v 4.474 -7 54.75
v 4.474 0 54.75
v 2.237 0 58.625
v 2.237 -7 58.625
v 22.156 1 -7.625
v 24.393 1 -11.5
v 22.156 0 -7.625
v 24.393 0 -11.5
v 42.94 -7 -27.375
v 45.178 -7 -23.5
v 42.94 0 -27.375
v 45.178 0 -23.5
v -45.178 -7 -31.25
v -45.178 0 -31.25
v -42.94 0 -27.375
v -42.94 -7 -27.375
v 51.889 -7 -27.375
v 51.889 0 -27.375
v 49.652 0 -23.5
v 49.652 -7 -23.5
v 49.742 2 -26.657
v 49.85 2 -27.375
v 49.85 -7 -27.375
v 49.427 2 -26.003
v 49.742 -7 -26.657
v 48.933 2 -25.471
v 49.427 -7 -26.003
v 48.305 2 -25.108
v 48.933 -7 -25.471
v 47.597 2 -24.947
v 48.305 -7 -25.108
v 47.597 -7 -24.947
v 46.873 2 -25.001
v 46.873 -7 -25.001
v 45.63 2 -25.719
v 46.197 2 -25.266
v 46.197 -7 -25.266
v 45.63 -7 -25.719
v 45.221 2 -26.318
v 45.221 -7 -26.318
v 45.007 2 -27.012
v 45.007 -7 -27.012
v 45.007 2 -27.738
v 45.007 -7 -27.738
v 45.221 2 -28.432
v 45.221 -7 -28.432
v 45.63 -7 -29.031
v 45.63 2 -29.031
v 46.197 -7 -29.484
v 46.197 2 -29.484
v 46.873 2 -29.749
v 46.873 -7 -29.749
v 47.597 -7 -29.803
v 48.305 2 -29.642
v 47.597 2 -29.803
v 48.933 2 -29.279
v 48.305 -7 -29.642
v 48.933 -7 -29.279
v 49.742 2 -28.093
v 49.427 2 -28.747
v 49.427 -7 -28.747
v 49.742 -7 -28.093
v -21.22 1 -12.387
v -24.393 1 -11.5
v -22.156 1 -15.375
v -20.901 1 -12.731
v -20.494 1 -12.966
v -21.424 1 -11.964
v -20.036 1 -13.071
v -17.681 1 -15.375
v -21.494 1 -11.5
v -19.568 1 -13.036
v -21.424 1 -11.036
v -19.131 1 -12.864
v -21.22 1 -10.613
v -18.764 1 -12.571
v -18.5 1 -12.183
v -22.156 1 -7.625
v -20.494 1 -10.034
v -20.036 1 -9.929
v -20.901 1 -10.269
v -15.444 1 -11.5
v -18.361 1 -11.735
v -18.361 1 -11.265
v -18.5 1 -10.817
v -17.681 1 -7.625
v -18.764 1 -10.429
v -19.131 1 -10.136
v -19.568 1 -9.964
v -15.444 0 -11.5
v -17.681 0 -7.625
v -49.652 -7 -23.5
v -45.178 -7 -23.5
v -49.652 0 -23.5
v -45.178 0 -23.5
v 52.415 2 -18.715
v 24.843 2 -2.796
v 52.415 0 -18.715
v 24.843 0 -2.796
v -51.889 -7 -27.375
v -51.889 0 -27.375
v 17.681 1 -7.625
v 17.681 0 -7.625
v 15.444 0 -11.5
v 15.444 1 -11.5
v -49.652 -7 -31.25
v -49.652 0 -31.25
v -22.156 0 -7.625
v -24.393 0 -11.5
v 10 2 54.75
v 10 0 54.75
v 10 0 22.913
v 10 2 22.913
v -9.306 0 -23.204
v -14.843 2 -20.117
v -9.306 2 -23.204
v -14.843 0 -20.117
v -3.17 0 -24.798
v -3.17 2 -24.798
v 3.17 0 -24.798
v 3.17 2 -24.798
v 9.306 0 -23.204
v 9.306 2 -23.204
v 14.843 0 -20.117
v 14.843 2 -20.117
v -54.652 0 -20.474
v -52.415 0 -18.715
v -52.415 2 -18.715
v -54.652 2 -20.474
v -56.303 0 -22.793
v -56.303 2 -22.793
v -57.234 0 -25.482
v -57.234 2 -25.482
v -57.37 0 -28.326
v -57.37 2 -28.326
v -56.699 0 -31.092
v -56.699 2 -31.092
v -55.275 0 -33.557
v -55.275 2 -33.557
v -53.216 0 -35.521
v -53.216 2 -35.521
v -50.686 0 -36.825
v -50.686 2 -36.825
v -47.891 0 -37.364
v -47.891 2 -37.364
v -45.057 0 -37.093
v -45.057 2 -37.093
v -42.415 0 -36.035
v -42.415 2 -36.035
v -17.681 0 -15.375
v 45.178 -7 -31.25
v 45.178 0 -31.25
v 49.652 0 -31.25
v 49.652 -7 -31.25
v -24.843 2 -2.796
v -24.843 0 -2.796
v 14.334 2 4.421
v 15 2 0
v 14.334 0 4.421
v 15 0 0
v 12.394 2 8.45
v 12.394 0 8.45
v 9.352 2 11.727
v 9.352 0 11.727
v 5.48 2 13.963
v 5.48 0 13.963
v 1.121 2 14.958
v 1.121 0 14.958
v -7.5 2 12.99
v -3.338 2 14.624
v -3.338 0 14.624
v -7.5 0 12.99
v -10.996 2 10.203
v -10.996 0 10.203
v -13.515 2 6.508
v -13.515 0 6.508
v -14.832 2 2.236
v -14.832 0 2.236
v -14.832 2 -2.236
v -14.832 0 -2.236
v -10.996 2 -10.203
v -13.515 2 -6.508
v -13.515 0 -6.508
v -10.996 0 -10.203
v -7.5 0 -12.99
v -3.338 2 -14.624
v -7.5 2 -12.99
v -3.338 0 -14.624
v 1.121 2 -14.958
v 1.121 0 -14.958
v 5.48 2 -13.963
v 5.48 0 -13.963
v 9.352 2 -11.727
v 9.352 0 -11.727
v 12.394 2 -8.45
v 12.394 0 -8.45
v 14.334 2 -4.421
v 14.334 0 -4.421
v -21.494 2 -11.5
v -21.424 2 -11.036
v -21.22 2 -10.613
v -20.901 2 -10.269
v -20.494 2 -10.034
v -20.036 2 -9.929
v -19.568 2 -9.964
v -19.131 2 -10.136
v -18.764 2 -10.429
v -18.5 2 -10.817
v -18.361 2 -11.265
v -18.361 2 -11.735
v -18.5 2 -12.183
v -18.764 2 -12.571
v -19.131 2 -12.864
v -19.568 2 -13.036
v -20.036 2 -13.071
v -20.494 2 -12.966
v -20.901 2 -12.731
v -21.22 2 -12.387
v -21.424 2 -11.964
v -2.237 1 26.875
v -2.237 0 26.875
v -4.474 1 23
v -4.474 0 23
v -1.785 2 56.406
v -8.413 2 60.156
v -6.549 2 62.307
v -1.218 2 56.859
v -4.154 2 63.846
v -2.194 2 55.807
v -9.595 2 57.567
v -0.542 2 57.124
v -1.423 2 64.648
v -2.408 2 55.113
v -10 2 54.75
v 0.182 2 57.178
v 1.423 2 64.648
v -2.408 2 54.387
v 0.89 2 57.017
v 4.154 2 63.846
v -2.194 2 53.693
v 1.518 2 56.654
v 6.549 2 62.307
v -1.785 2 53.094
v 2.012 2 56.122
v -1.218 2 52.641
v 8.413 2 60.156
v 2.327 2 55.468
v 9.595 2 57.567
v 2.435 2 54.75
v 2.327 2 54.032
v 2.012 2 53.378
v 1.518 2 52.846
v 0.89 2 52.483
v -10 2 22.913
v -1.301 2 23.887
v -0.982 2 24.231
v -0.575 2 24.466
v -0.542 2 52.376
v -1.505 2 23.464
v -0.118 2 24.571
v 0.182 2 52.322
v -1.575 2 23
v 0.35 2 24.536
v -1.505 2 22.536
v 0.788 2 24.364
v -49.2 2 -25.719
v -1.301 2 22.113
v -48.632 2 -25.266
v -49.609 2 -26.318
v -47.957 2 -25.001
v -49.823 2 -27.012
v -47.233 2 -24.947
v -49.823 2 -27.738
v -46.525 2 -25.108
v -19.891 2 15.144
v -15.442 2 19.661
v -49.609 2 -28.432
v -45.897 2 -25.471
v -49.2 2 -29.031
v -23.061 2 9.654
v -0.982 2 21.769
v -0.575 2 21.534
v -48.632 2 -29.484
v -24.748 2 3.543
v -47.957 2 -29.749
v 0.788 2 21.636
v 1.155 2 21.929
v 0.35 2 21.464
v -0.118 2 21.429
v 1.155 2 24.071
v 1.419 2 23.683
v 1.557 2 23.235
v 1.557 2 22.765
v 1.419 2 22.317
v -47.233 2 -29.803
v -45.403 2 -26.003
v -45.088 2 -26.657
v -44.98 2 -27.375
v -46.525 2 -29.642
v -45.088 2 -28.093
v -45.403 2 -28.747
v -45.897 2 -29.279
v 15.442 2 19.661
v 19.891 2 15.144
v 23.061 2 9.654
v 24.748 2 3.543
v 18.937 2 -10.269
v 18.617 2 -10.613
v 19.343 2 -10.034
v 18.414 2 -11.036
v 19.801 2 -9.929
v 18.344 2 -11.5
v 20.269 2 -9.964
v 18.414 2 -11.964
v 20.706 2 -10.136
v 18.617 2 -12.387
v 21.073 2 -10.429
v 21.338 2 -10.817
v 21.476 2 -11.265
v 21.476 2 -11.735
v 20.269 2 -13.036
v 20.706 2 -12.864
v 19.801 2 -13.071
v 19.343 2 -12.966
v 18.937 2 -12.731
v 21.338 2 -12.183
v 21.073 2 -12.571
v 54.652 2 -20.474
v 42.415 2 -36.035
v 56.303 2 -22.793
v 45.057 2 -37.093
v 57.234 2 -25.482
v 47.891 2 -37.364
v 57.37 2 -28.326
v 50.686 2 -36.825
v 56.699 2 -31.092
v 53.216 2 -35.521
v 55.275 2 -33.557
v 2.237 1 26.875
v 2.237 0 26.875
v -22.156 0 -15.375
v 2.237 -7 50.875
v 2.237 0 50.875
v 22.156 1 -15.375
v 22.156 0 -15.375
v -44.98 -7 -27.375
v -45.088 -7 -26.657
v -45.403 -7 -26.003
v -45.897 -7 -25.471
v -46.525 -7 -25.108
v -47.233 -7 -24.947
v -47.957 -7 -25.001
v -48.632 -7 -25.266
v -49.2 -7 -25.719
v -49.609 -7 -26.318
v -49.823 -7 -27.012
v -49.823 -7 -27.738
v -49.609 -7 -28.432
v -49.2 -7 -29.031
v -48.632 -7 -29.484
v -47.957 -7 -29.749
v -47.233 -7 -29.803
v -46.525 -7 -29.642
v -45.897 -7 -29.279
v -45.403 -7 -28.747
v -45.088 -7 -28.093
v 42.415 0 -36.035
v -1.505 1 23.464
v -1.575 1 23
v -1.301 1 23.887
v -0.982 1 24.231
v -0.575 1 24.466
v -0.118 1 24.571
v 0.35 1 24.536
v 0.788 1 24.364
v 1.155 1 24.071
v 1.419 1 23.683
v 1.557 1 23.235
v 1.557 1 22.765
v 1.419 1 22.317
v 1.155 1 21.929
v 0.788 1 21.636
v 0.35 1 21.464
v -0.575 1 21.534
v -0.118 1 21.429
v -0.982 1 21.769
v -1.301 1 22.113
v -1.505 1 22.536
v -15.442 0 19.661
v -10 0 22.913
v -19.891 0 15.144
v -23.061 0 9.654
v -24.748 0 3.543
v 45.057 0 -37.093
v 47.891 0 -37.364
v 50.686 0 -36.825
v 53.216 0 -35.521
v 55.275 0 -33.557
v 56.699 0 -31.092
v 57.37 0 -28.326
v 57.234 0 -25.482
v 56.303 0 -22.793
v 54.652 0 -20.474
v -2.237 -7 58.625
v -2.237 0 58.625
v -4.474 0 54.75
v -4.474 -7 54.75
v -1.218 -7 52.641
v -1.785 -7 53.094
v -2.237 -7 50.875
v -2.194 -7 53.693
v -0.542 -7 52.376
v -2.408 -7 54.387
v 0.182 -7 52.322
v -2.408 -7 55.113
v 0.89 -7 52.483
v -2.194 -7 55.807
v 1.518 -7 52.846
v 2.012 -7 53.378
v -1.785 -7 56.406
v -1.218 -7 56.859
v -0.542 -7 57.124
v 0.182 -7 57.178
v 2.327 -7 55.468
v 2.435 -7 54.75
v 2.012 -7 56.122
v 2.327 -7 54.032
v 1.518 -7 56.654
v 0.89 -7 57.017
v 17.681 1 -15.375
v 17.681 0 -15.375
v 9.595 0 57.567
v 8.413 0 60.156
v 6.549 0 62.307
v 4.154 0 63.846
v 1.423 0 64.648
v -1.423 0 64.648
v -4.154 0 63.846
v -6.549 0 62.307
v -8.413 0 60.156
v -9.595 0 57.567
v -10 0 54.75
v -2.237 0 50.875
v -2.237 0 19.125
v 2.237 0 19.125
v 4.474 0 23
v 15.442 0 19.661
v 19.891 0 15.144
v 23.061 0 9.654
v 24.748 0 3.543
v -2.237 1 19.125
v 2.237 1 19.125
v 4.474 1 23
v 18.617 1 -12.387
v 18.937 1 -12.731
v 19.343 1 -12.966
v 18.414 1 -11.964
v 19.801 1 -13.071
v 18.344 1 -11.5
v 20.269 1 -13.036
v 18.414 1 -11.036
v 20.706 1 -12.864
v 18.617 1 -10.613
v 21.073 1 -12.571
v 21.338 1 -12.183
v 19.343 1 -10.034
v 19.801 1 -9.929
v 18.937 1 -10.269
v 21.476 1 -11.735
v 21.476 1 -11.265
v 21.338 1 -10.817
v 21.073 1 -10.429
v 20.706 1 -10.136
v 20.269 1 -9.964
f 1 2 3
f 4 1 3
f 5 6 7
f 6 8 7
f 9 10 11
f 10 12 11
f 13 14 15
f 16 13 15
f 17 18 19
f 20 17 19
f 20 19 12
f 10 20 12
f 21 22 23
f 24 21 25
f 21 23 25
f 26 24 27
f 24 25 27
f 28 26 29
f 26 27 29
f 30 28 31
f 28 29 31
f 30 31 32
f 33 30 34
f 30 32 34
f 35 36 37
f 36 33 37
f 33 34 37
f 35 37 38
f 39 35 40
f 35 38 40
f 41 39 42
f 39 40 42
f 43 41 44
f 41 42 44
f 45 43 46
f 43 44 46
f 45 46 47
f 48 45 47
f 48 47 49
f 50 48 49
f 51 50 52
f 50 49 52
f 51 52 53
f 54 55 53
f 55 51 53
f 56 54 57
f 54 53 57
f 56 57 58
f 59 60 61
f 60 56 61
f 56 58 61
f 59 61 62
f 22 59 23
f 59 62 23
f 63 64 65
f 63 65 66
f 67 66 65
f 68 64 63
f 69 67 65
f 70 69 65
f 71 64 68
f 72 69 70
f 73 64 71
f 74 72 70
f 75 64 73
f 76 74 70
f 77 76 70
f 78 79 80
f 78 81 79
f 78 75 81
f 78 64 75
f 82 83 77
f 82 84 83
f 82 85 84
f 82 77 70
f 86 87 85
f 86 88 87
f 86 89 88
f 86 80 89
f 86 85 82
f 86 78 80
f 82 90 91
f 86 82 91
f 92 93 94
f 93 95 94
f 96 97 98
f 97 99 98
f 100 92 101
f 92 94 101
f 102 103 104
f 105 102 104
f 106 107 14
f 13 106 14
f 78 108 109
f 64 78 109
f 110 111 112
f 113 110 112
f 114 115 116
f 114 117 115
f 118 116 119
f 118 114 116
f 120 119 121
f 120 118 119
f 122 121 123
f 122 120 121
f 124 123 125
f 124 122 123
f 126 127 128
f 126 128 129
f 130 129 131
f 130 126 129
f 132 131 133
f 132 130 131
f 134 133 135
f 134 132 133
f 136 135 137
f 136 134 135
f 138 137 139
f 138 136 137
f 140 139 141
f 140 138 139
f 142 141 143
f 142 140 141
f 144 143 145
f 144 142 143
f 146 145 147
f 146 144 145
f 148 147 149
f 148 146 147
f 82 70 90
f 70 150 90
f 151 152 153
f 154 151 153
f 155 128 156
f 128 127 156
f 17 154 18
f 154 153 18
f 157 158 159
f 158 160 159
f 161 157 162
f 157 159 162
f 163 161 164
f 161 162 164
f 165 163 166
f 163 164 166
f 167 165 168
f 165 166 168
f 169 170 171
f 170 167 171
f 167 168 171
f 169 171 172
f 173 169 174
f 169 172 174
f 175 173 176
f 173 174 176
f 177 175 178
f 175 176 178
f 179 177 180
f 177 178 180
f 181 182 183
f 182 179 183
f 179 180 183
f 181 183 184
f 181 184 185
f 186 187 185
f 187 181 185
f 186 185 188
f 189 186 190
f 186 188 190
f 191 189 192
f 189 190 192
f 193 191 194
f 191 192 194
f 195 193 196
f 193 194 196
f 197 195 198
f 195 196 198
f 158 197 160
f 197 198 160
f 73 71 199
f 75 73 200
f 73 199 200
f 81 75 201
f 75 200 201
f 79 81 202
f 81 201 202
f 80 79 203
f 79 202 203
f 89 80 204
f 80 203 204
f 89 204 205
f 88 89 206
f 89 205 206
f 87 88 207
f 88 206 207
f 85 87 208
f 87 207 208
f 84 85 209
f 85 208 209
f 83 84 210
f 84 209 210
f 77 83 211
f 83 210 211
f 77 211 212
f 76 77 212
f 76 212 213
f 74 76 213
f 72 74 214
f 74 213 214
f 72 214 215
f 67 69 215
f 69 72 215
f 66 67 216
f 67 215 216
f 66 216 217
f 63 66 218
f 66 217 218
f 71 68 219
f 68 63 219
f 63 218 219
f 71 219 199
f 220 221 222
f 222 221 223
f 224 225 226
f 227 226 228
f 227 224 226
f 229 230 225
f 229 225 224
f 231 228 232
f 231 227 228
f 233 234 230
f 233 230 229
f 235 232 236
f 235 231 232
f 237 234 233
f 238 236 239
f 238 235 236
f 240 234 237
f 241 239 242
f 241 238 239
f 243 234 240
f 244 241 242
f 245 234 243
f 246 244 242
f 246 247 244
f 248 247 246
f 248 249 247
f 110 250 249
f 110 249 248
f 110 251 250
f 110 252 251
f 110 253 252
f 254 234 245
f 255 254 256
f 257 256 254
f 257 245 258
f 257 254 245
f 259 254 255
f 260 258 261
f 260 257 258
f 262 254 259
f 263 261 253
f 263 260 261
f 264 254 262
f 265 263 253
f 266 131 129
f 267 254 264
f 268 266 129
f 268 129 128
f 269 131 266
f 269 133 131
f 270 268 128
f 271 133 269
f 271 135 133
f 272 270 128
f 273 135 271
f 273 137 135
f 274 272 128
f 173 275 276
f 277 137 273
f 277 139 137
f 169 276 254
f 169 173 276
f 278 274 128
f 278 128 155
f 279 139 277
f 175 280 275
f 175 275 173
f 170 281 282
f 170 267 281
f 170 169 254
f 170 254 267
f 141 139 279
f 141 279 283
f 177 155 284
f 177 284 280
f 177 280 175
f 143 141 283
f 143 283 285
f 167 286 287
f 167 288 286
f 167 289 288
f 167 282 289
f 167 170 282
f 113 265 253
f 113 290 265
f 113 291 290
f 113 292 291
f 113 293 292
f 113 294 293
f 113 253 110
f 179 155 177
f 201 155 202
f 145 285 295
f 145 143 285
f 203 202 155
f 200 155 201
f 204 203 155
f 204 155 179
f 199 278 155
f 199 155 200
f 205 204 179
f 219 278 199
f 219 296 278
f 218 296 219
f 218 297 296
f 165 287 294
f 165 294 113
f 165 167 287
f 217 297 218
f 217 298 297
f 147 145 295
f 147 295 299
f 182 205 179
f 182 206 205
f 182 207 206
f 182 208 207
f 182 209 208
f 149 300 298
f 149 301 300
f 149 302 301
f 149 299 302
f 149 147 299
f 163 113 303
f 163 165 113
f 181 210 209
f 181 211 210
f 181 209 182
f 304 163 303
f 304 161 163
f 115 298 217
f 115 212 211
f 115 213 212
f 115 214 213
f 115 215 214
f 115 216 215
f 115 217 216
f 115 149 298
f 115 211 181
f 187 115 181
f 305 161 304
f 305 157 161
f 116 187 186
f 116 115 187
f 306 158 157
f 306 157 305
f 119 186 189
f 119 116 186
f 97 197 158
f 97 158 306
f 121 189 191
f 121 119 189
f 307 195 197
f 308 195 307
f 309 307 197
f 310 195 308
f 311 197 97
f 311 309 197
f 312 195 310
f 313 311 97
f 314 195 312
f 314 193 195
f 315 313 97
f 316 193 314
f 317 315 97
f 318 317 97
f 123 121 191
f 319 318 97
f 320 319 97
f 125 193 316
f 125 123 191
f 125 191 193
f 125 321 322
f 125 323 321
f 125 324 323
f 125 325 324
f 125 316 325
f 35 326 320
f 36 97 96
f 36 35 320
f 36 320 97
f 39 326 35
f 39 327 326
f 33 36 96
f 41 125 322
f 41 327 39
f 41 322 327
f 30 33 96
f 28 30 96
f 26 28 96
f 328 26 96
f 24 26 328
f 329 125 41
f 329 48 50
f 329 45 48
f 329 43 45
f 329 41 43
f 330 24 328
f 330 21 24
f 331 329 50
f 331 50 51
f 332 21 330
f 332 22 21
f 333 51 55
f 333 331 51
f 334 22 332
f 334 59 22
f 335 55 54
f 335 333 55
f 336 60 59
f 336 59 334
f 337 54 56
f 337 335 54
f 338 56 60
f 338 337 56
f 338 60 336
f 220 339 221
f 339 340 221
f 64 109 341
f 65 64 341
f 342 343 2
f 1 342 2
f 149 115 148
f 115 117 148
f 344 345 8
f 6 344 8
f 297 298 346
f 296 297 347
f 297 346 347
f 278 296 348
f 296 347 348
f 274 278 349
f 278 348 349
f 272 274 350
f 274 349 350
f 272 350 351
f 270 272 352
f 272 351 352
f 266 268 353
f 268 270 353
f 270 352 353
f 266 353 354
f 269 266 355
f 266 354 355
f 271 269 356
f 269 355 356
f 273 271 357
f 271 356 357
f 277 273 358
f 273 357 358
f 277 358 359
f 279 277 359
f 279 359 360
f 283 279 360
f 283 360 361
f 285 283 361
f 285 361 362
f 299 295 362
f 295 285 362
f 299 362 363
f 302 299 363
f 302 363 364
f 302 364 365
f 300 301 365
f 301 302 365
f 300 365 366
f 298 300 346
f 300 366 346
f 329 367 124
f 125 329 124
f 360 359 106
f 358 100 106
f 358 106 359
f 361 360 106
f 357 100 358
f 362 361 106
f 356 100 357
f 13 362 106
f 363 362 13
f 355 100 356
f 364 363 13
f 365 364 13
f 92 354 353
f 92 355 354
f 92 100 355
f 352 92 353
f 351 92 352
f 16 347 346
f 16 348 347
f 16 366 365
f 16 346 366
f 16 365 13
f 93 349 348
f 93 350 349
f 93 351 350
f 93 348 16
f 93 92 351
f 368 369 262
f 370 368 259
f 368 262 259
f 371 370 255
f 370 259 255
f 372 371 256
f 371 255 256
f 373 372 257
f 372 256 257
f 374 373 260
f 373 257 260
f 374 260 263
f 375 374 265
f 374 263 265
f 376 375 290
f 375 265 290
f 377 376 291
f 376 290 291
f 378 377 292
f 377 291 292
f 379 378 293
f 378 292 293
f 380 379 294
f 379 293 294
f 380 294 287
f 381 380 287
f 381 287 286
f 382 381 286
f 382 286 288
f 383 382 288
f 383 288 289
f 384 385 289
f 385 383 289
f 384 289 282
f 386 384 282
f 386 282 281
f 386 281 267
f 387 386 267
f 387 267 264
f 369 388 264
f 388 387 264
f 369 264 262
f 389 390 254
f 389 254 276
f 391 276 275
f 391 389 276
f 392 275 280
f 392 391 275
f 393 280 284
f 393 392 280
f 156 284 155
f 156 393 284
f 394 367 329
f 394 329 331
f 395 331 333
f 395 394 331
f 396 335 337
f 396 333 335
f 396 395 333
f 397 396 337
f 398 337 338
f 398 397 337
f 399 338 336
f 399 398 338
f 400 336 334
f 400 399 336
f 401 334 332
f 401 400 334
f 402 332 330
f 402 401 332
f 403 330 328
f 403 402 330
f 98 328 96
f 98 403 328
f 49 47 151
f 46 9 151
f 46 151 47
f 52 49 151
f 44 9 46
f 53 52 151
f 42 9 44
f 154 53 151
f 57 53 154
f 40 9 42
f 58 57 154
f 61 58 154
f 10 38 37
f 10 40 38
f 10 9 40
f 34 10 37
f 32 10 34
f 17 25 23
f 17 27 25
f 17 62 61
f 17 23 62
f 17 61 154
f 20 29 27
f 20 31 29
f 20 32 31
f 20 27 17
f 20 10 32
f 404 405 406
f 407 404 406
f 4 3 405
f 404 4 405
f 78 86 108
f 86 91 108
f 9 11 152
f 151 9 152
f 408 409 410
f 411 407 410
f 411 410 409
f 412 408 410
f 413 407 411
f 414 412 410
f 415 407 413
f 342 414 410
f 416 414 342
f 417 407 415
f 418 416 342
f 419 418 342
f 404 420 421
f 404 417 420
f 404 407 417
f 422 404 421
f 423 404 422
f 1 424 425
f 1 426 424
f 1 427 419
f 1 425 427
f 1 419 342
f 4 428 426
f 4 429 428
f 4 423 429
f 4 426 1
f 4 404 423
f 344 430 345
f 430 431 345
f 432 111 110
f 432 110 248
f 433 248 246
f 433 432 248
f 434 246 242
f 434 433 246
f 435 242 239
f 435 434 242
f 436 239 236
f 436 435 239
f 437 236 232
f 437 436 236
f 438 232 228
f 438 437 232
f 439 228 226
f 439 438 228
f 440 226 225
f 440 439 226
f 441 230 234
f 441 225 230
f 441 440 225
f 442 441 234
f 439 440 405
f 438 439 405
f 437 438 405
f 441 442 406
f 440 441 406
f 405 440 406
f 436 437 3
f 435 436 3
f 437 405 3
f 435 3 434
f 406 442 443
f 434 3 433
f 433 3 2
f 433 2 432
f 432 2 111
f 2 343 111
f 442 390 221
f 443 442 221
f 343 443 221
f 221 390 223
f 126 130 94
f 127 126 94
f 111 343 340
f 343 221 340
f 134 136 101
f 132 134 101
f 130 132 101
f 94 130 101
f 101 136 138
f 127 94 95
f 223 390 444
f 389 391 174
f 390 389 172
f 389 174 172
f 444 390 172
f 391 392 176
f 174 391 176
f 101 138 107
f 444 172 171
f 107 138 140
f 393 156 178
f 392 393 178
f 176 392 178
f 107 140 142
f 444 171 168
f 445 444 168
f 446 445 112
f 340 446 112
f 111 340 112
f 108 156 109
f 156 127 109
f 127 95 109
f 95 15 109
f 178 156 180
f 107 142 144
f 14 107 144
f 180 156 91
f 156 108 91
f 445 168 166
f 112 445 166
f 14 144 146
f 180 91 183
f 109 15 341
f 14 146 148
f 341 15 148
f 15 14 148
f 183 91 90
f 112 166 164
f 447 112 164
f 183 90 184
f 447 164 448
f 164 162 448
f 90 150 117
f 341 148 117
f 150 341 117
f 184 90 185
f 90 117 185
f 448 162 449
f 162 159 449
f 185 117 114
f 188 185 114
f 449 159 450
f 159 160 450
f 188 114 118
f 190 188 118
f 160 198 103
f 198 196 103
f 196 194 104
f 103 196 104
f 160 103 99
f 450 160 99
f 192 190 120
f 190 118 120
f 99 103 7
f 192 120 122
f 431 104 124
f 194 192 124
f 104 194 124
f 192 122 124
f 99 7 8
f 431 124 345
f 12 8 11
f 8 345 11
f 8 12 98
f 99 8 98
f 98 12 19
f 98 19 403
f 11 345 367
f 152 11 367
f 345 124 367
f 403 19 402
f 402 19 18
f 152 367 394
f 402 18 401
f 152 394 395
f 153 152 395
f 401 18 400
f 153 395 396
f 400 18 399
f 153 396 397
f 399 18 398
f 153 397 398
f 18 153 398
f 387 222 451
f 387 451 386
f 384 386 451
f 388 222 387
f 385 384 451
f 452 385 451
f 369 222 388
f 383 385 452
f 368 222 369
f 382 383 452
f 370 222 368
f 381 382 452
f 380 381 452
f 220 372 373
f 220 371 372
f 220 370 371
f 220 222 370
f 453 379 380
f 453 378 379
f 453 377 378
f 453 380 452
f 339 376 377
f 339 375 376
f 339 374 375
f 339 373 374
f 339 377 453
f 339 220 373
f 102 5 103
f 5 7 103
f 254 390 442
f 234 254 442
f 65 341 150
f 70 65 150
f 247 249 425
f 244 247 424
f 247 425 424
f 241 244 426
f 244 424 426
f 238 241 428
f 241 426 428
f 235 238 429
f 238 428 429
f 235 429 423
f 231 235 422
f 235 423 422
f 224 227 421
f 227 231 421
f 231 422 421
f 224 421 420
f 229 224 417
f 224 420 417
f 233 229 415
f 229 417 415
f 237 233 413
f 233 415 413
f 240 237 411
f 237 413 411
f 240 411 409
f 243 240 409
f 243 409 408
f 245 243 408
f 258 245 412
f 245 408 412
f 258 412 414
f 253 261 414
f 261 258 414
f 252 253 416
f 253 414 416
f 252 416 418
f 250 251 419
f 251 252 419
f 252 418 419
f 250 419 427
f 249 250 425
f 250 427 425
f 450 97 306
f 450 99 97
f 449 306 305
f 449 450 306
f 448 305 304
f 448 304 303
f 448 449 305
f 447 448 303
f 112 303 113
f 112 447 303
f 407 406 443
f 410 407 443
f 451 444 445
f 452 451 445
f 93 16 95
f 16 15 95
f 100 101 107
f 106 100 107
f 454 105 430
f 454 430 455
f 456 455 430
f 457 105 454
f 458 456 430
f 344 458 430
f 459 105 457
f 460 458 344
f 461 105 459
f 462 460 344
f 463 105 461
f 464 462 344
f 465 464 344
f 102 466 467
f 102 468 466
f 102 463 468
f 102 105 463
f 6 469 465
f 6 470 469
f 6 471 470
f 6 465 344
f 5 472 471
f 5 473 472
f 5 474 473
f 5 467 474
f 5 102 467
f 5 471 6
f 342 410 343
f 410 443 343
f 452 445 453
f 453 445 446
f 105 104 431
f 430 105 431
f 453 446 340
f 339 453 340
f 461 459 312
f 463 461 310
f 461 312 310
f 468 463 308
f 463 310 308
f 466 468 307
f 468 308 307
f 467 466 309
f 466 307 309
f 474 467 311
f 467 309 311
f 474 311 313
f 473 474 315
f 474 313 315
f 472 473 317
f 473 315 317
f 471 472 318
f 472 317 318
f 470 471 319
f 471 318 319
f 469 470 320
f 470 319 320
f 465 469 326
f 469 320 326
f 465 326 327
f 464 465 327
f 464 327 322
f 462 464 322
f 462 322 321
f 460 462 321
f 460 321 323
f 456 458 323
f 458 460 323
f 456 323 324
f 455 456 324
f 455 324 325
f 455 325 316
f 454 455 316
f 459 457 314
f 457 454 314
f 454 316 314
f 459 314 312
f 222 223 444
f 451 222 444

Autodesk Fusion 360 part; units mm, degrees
sketch "Sketch1" plane through (0, 0, 0) normal (0, 1, 0) x (1, 0, 0)
  circle A0 centre (0, 0) radius 15
  circle A1 centre (0, 0) radius 25
  line L0 (0, 0) -> (0, -54.75) construction
  circle A2 centre (0, -54.75) radius 2.435
  line L1 (4.5611, -54.75) -> (2.2805, -50.8)
  line L2 (2.2805, -50.8) -> (-2.2805, -50.8)
  line L3 (-2.2805, -50.8) -> (-4.5611, -54.75)
  line L4 (-4.5611, -54.75) -> (-2.2805, -58.7)
  line L5 (-2.2805, -58.7) -> (2.2805, -58.7)
  line L6 (2.2805, -58.7) -> (4.5611, -54.75)
  line L7 (-10, -22.9129) -> (-10, -54.75)
  arc A3 (-10, -54.75) -> (10, -54.75) centre (0, -54.75) ccw
  line L8 (10, -54.75) -> (10, -22.9129)
  line L9 (0, 0) -> (47.4149, 27.375) construction
  line L10 (45.1344, 31.325) -> (42.8538, 27.375)
  circle A4 centre (47.4149, 27.375) radius 2.435
  line L11 (51.976, 27.375) -> (49.6954, 31.325)
  line L12 (42.8538, 27.375) -> (45.1344, 23.425)
  line L13 (49.6954, 23.425) -> (51.976, 27.375)
  line L14 (45.1344, 23.425) -> (49.6954, 23.425)
  arc A5 (52.4149, 18.7147) -> (42.4149, 36.0353) centre (47.4149, 27.375) ccw
  line L15 (49.6954, 31.325) -> (45.1344, 31.325)
  line L16 (42.4149, 36.0353) -> (14.8431, 20.1167)
  line L17 (24.8431, 2.7962) -> (52.4149, 18.7147)
  line L18 (0, 0) -> (-47.4149, 27.375) construction
  line L19 (-49.6954, 23.425) -> (-45.1344, 23.425)
  circle A6 centre (-47.4149, 27.375) radius 2.435
  line L20 (-49.6954, 31.325) -> (-51.976, 27.375)
  line L21 (-45.1344, 23.425) -> (-42.8538, 27.375)
  line L22 (-45.1344, 31.325) -> (-49.6954, 31.325)
  line L23 (-42.8538, 27.375) -> (-45.1344, 31.325)
  arc A7 (-42.4149, 36.0353) -> (-52.4149, 18.7147) centre (-47.4149, 27.375) ccw
  line L24 (-51.976, 27.375) -> (-49.6954, 23.425)
  line L25 (-52.4149, 18.7147) -> (-24.8431, 2.7962)
  line L26 (-14.8431, 20.1167) -> (-42.4149, 36.0353)
  point P0 (0, -54.75)
  point P1 (47.4149, 27.375)
  point P2 (-47.4149, 27.375)
  dimension "d1" = 30
  dimension "d2" = 50
  dimension "d3" = 7.9
  dimension "d4" = 4.87
  dimension "d5" = 50.8
  dimension "d6" = 10
  dimension "d8" = 360
extrude "Extrude1" add sketch "Sketch1" along normal blind 2 contours A1 | A1 A5 L16 L17 | A1 L7 A3 L8 | A1 A7 L25 L26 | L1 L2 L3 L4 L5 L6 | L10 L11 L12 L13 L14 L15 | L19 L20 L21 L22 L23 L24
sketch "Sketch2" plane through (0, 0, 0) normal (0, -1, 0) x (1, 0, 0)
  circle A0 centre (0, 0) radius 15
  circle A1 centre (47.4149, -27.375) radius 2.435
  circle A2 centre (0, 54.75) radius 2.435
  circle A3 centre (-47.4149, -27.375) radius 2.435
  line L0 (-42.4149, -36.0353) -> (-14.8431, -20.1167)
  arc A4 (-14.8431, -20.1167) -> (14.8431, -20.1167) centre (0, 0) ccw
  line L1 (14.8431, -20.1167) -> (42.4149, -36.0353)
  arc A5 (42.4149, -36.0353) -> (52.4149, -18.7147) centre (47.4149, -27.375) ccw
  line L2 (52.4149, -18.7147) -> (24.8431, -2.7962)
  arc A6 (24.8431, -2.7962) -> (10, 22.9129) centre (0, 0) ccw
  line L3 (10, 22.9129) -> (10, 54.75)
  arc A7 (10, 54.75) -> (-10, 54.75) centre (0, 54.75) ccw
  line L4 (-10, 54.75) -> (-10, 22.9129)
  arc A8 (-10, 22.9129) -> (-24.8431, -2.7962) centre (0, 0) ccw
  line L5 (-24.8431, -2.7962) -> (-52.4149, -18.7147)
  arc A9 (-52.4149, -18.7147) -> (-42.4149, -36.0353) centre (-47.4149, -27.375) ccw
  line L6 (2.2372, 50.875) -> (4.4745, 54.75)
  line L7 (4.4745, 54.75) -> (2.2372, 58.625)
  line L8 (2.2372, 58.625) -> (-2.2372, 58.625)
  line L9 (-2.2372, 58.625) -> (-4.4745, 54.75)
  line L10 (-4.4745, 54.75) -> (-2.2372, 50.875)
  line L11 (-2.2372, 50.875) -> (2.2372, 50.875)
  line L12 (-51.8894, -27.375) -> (-49.6521, -31.25)
  line L13 (-45.1777, -23.5) -> (-49.6521, -23.5)
  line L14 (-42.9404, -27.375) -> (-45.1777, -23.5)
  line L15 (-49.6521, -31.25) -> (-45.1777, -31.25)
  circle A10 centre (-47.4149, -27.375) radius 2.435
  line L16 (-45.1777, -31.25) -> (-42.9404, -27.375)
  line L17 (-49.6521, -23.5) -> (-51.8894, -27.375)
  line L18 (49.6521, -31.25) -> (51.8894, -27.375)
  line L19 (42.9404, -27.375) -> (45.1777, -31.25)
  line L20 (45.1777, -23.5) -> (42.9404, -27.375)
  line L21 (51.8894, -27.375) -> (49.6521, -23.5)
  circle A11 centre (47.4149, -27.375) radius 2.435
  line L22 (49.6521, -23.5) -> (45.1777, -23.5)
  line L23 (45.1777, -31.25) -> (49.6521, -31.25)
  point P0 (0, 54.75)
  point P1 (-47.4149, -27.375)
  point P2 (47.4149, -27.375)
  dimension "d11" = 7.75
  dimension "d13" = 360
extrude "Extrude2" add sketch "Sketch2" along normal blind 7 contours L6 L7 L8 L9 L10 L11 | L12 L13 L14 L15 L16 L17 | L18 L19 L20 L21 L22 L23
sketch "Sketch3" plane through (0, 2, 0) normal (0, 1, 0) x (-1, 0, 0)
  circle A0 centre (0, 0) radius 15
  circle A1 centre (-47.4149, -27.375) radius 2.435
  circle A2 centre (0, 54.75) radius 2.435
  circle A3 centre (47.4149, -27.375) radius 2.435
  line L0 (14.8431, -20.1167) -> (42.4149, -36.0353)
  arc A4 (42.4149, -36.0353) -> (52.4149, -18.7147) centre (47.4149, -27.375) ccw
  line L1 (52.4149, -18.7147) -> (24.8431, -2.7962)
  arc A5 (24.8431, -2.7962) -> (10, 22.9129) centre (0, 0) ccw
  line L2 (10, 22.9129) -> (10, 54.75)
  arc A6 (10, 54.75) -> (-10, 54.75) centre (0, 54.75) ccw
  line L3 (-10, 54.75) -> (-10, 22.9129)
  arc A7 (-10, 22.9129) -> (-24.8431, -2.7962) centre (0, 0) ccw
  line L4 (-24.8431, -2.7962) -> (-52.4149, -18.7147)
  arc A8 (-52.4149, -18.7147) -> (-42.4149, -36.0353) centre (-47.4149, -27.375) ccw
  line L5 (-42.4149, -36.0353) -> (-14.8431, -20.1167)
  arc A9 (-14.8431, -20.1167) -> (14.8431, -20.1167) centre (0, 0) ccw
  line L6 (0, 54.75) -> (0, 15) construction
  circle A10 centre (0, 23) radius 3
  circle A11 centre (0, 23) radius 1.575
  circle A12 centre (-19.9186, -11.5) radius 3
  circle A13 centre (-19.9186, -11.5) radius 1.575
  circle A14 centre (19.9186, -11.5) radius 3
  circle A15 centre (19.9186, -11.5) radius 1.575
  dimension "d16" = 8
  dimension "d17" = 6
  dimension "d18" = 3.15
  dimension "d20" = 360
extrude "Extrude6" cut sketch "Sketch3" against normal up to surface (2 mm away) contours A11 | A13 | A15
sketch "Sketch5" plane through (0, 0, 0) normal (0, -1, 0) x (1, 0, 0)
  circle A0 centre (19.9186, -11.5) radius 1.575
  circle A1 centre (0, 23) radius 1.575
  circle A2 centre (-19.9186, -11.5) radius 1.575
  line L0 (-2.2372, 50.875) -> (-4.4745, 54.75)
  line L1 (-4.4745, 54.75) -> (-2.2372, 58.625)
  line L2 (-2.2372, 58.625) -> (2.2372, 58.625)
  line L3 (2.2372, 58.625) -> (4.4745, 54.75)
  line L4 (4.4745, 54.75) -> (2.2372, 50.875)
  line L5 (2.2372, 50.875) -> (-2.2372, 50.875)
  line L6 (-49.6521, -23.5) -> (-45.1777, -23.5)
  line L7 (-45.1777, -23.5) -> (-42.9404, -27.375)
  line L8 (-42.9404, -27.375) -> (-45.1777, -31.25)
  line L9 (-45.1777, -31.25) -> (-49.6521, -31.25)
  line L10 (-49.6521, -31.25) -> (-51.8894, -27.375)
  line L11 (-51.8894, -27.375) -> (-49.6521, -23.5)
  line L12 (45.1777, -31.25) -> (42.9404, -27.375)
  line L13 (42.9404, -27.375) -> (45.1777, -23.5)
  line L14 (45.1777, -23.5) -> (49.6521, -23.5)
  line L15 (49.6521, -23.5) -> (51.8894, -27.375)
  line L16 (51.8894, -27.375) -> (49.6521, -31.25)
  line L17 (49.6521, -31.25) -> (45.1777, -31.25)
  circle A3 centre (0, 0) radius 15
  line L18 (-42.4149, -36.0353) -> (-14.8431, -20.1167)
  arc A4 (-14.8431, -20.1167) -> (14.8431, -20.1167) centre (0, 0) ccw
  line L19 (14.8431, -20.1167) -> (42.4149, -36.0353)
  arc A5 (42.4149, -36.0353) -> (52.4149, -18.7147) centre (47.4149, -27.375) ccw
  line L20 (52.4149, -18.7147) -> (24.8431, -2.7962)
  arc A6 (24.8431, -2.7962) -> (10, 22.9129) centre (0, 0) ccw
  line L21 (10, 22.9129) -> (10, 54.75)
  arc A7 (10, 54.75) -> (-10, 54.75) centre (0, 54.75) ccw
  line L22 (-10, 54.75) -> (-10, 22.9129)
  arc A8 (-10, 22.9129) -> (-24.8431, -2.7962) centre (0, 0) ccw
  line L23 (-24.8431, -2.7962) -> (-52.4149, -18.7147)
  arc A9 (-52.4149, -18.7147) -> (-42.4149, -36.0353) centre (-47.4149, -27.375) ccw
  line L24 (2.2372, 26.875) -> (-2.2372, 26.875)
  line L25 (-2.2372, 26.875) -> (-4.4745, 23)
  line L26 (-4.4745, 23) -> (-2.2372, 19.125)
  line L27 (-2.2372, 19.125) -> (2.2372, 19.125)
  line L28 (2.2372, 19.125) -> (4.4745, 23)
  line L29 (4.4745, 23) -> (2.2372, 26.875)
  line L30 (-22.1558, -15.375) -> (-17.6814, -15.375)
  line L31 (-22.1558, -7.625) -> (-24.393, -11.5)
  circle A10 centre (-19.9186, -11.5) radius 1.575
  line L32 (-17.6814, -15.375) -> (-15.4441, -11.5)
  line L33 (-24.393, -11.5) -> (-22.1558, -15.375)
  line L34 (-15.4441, -11.5) -> (-17.6814, -7.625)
  line L35 (-17.6814, -7.625) -> (-22.1558, -7.625)
  line L36 (24.393, -11.5) -> (22.1558, -7.625)
  line L37 (17.6814, -15.375) -> (22.1558, -15.375)
  circle A11 centre (19.9186, -11.5) radius 1.575
  line L38 (22.1558, -7.625) -> (17.6814, -7.625)
  line L39 (22.1558, -15.375) -> (24.393, -11.5)
  line L40 (17.6814, -7.625) -> (15.4441, -11.5)
  line L41 (15.4441, -11.5) -> (17.6814, -15.375)
  point P0 (0, 23)
  point P1 (-19.9186, -11.5)
  point P2 (19.9186, -11.5)
  dimension "d32" = 7.75
  dimension "d34" = 360
extrude "Extrude7" cut sketch "Sketch5" against normal up to surface (1 mm away) contours L24 L25 L26 L27 L28 L29 | L30 L31 L32 L33 L34 L35 | L36 L37 L38 L39 L40 L41
